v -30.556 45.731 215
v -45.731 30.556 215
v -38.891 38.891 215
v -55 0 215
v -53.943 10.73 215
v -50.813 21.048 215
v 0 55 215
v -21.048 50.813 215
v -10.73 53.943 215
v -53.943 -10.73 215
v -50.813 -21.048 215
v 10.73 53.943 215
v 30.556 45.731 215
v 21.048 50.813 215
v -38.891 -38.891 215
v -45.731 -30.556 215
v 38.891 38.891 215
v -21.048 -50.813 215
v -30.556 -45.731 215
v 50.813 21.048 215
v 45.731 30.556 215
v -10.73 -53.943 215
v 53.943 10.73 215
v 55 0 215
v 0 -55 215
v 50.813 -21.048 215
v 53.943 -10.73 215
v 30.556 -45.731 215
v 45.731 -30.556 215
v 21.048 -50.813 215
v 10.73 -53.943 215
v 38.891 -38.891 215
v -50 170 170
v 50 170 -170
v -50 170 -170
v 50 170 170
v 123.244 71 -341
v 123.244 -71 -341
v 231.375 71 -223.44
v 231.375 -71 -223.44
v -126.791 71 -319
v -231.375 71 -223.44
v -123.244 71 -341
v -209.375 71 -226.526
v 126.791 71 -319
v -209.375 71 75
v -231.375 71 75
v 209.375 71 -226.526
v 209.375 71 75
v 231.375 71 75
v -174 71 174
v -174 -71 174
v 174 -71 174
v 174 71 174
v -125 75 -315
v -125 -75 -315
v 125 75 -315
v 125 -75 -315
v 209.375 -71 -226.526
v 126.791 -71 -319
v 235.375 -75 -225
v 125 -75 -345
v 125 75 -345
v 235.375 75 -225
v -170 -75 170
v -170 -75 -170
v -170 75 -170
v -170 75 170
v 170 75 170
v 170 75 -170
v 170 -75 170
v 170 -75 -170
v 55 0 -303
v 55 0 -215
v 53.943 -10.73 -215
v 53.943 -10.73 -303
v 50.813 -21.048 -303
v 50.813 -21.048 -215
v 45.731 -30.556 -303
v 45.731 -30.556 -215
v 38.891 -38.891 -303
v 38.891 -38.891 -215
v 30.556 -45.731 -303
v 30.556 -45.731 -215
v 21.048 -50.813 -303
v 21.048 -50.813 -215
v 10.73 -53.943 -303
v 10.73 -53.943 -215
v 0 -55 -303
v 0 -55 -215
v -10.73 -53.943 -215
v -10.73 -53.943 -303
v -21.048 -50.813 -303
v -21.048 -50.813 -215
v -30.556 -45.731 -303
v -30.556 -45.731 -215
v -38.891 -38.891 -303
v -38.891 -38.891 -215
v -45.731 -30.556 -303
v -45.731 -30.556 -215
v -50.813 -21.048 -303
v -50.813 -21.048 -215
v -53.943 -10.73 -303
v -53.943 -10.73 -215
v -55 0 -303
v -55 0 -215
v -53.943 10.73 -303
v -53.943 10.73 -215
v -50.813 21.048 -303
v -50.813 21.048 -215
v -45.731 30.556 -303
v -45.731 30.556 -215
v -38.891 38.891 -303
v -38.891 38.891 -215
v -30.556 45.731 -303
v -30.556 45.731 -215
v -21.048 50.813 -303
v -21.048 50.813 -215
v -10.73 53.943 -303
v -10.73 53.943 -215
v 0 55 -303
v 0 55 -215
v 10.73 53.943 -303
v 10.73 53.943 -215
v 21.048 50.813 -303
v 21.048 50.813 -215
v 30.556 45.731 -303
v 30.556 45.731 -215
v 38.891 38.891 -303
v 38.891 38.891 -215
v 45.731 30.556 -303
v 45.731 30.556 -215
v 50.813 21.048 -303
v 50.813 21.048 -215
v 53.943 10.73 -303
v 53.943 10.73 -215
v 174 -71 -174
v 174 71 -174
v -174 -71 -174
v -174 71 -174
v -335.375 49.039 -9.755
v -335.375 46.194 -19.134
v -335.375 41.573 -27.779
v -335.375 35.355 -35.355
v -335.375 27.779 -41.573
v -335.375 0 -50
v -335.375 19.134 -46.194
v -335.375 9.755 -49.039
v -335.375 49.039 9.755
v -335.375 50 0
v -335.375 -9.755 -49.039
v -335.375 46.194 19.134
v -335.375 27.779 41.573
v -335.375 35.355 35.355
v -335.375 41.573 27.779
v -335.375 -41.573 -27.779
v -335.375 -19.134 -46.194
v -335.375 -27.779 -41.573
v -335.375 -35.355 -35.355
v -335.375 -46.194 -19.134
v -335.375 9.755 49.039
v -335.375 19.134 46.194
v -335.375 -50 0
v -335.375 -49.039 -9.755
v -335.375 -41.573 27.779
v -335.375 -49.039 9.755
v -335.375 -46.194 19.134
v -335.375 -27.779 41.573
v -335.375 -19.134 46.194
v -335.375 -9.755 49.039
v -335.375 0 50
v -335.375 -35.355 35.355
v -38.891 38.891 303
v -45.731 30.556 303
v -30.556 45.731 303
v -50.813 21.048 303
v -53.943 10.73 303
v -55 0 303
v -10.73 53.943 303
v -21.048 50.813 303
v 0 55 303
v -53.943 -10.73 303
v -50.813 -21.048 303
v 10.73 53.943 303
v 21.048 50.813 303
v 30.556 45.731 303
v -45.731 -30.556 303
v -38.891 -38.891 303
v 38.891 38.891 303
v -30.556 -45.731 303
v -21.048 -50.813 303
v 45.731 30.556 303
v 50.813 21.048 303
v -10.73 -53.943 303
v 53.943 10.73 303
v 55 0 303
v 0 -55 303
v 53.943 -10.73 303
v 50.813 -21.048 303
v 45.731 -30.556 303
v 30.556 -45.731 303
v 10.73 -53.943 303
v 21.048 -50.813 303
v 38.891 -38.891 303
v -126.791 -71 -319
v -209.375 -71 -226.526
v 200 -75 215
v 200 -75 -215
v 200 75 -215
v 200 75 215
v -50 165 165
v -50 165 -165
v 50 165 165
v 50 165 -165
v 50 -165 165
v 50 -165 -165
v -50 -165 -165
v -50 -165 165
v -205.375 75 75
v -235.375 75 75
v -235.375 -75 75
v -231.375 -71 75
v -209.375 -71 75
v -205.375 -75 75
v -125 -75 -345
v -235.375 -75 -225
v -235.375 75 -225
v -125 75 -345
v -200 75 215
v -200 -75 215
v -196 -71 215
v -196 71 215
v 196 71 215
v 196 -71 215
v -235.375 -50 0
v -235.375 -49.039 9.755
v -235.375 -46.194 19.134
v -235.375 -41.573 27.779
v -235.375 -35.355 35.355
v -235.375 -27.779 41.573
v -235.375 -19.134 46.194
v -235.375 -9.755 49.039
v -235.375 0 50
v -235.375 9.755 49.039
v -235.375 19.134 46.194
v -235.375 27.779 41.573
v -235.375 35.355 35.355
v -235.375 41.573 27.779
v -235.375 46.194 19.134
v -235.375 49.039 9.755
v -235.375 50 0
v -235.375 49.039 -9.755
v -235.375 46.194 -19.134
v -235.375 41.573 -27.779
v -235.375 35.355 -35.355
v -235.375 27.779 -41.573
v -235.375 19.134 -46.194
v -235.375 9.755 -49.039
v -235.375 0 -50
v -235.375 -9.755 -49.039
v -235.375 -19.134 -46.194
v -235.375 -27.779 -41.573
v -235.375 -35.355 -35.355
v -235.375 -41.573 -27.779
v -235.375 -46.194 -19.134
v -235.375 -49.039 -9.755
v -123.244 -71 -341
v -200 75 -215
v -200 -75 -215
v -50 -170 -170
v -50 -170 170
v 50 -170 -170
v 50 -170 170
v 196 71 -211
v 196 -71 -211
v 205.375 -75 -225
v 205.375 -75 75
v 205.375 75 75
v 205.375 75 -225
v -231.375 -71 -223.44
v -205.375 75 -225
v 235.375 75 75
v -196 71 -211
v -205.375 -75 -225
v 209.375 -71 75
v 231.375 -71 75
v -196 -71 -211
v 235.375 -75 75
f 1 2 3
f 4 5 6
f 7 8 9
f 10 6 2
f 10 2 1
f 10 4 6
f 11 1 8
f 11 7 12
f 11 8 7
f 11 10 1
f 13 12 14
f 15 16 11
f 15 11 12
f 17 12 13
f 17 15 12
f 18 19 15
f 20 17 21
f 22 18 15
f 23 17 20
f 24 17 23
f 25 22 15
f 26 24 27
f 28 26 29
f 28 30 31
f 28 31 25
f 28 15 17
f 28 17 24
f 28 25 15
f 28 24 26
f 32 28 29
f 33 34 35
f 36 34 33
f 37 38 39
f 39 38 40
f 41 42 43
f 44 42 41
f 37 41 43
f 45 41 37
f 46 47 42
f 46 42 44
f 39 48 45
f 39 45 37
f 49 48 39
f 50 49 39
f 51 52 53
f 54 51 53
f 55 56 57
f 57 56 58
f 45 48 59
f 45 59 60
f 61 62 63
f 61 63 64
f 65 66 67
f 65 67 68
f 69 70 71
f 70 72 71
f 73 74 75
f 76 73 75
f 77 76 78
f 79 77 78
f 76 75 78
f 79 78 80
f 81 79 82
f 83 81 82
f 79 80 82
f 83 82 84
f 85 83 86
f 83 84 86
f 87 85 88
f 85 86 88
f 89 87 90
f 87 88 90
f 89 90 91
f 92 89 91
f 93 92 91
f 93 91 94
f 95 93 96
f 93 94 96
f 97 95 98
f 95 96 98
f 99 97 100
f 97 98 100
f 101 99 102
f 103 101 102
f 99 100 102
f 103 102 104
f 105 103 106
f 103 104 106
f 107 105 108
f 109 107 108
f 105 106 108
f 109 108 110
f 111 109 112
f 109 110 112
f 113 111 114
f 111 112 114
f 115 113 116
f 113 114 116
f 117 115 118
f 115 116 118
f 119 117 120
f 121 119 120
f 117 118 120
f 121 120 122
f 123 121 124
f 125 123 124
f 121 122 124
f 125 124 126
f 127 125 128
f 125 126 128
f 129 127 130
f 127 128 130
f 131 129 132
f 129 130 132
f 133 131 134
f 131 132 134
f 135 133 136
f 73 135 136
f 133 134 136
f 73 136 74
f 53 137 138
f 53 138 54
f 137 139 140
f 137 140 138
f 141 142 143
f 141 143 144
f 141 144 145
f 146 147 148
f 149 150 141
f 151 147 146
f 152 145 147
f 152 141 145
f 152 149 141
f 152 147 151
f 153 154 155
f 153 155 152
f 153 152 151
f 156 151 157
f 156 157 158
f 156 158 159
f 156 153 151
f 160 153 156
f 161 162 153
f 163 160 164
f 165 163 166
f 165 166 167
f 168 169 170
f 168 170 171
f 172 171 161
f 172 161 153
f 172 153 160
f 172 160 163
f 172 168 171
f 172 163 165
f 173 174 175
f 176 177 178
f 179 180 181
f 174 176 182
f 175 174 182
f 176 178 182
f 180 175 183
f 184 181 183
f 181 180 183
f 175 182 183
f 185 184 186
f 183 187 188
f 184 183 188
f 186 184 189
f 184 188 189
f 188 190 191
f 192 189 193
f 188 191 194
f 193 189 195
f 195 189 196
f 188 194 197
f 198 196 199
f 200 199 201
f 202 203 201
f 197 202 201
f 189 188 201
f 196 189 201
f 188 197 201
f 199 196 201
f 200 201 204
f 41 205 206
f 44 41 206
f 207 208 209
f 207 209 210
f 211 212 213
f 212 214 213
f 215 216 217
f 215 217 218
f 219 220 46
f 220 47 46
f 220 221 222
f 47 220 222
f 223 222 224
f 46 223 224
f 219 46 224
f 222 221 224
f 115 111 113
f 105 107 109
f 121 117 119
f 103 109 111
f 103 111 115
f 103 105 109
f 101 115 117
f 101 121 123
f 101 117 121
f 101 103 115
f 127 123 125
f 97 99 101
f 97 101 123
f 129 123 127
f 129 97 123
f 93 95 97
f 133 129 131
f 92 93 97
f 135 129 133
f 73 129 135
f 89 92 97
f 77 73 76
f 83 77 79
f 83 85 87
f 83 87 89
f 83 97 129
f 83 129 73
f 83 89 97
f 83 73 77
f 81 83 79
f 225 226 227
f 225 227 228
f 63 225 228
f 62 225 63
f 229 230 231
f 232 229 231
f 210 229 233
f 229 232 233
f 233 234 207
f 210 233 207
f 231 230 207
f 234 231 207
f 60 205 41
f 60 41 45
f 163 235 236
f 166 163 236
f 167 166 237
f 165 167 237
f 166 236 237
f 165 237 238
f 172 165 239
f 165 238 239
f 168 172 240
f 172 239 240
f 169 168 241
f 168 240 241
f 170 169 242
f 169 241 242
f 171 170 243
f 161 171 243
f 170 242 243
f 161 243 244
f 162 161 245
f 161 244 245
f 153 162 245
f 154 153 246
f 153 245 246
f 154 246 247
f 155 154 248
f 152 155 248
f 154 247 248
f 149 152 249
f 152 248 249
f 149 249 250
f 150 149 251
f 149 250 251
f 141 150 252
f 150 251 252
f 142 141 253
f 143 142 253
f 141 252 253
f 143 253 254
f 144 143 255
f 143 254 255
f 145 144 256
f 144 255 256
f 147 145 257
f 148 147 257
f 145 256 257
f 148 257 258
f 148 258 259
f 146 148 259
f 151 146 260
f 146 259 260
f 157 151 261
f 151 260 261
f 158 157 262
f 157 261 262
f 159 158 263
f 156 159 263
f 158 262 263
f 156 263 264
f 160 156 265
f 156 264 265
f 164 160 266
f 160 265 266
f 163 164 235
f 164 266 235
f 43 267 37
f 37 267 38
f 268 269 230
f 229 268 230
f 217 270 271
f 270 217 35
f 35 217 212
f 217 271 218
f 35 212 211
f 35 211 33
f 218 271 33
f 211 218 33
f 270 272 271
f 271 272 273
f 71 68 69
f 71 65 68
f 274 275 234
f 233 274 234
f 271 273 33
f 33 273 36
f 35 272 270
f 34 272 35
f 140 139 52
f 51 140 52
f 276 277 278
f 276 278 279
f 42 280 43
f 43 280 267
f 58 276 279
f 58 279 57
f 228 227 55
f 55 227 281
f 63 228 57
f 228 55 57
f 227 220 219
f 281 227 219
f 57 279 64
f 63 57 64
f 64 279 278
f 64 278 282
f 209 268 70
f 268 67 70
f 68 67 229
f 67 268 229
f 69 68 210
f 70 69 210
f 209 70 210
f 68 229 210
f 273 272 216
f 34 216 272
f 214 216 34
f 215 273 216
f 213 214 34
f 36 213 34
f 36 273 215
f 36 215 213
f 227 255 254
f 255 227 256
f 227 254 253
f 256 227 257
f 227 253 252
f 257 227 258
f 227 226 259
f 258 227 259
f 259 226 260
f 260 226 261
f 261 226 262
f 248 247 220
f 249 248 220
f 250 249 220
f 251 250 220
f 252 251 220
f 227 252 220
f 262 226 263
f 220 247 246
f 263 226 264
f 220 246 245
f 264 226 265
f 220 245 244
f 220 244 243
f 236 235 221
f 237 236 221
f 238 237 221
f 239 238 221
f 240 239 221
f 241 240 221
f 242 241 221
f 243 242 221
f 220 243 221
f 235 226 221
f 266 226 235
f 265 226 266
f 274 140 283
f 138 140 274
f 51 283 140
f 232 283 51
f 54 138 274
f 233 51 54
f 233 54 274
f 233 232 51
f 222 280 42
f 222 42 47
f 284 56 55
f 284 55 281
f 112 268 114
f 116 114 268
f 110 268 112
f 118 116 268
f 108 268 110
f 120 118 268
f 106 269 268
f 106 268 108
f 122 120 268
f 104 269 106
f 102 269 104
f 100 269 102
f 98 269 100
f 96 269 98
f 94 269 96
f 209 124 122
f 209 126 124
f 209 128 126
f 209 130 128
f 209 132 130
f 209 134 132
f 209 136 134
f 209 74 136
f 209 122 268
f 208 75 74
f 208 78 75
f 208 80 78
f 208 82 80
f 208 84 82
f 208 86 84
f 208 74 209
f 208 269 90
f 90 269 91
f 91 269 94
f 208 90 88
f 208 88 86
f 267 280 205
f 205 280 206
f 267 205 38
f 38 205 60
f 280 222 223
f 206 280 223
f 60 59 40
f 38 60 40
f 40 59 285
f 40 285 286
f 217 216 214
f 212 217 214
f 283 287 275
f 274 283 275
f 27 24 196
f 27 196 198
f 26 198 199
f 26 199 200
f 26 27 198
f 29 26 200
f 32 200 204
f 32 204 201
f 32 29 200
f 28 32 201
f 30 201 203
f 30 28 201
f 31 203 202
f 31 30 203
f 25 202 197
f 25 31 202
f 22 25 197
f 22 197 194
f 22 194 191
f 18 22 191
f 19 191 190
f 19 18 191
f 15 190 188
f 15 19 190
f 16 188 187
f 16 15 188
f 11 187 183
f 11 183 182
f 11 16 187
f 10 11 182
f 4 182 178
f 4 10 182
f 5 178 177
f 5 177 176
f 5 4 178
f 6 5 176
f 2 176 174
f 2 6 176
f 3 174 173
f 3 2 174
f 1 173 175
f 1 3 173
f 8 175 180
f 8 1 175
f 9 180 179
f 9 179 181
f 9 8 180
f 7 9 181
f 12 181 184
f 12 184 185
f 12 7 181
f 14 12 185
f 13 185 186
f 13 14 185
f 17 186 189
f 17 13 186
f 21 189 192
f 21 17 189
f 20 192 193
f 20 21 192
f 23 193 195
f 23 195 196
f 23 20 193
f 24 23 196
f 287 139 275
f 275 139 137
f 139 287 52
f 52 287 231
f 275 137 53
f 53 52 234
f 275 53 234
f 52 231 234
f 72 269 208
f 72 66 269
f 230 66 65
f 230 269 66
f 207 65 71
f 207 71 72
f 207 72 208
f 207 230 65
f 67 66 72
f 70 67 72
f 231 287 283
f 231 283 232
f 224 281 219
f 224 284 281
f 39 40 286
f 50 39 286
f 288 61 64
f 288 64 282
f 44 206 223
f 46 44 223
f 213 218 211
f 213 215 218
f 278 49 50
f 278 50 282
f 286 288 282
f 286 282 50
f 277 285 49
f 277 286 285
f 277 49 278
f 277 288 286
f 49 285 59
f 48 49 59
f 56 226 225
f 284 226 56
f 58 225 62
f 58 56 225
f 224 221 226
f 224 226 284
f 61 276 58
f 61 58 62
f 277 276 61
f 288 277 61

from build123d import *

# Parameters (mm, degrees)
F0_W      = 340
F0_H      = 340
F0_W_2    = 330
F0_H_2    = 330
F1_DEPTH  = 50
F2_W      = 400
F2_H      = 430
F2_W_2    = 340
F2_H_2    = 340
F3_DEPTH  = 75
F4_W      = 30
F4_H      = 300
F4_W_2    = 250
F4_H_2    = 30
F5_DEPTH  = 75
F6_T      = -4
F8_T      = -4
F7_R      = 50
F9_DEPTH  = 100
F10_R     = 55
F11_DEPTH = 88


# Not quite as in the source:
# - a pattern or mirror of a feature is missing from the dataset's text; its kind, count and spacing are read off the source's solid


with BuildPart() as f1:
    # F0 (on Right) → F1 (new body, symmetric)
    with BuildSketch(Plane.YZ):
        Rectangle(F0_W, F0_H)
        Rectangle(F0_W_2, F0_H_2, mode=Mode.SUBTRACT)
    extrude(amount=F1_DEPTH, both=True)


with BuildPart() as f3:
    # F2 (on Front) → F3 (new body, symmetric)
    with BuildSketch(Plane.XZ):
        Rectangle(F2_W, F2_H)
        Rectangle(F2_W_2, F2_H_2, mode=Mode.SUBTRACT)
    extrude(amount=F3_DEPTH, both=True)

    # F8
    f8_openings = [f3.faces().sort_by_distance(p)[0] for p in [
        (0, 0, 215),
    ]]
    offset(amount=F8_T, openings=f8_openings, kind=Kind.INTERSECTION)

    # F10 (on face) → F11 (join)
    with BuildSketch(Plane(origin=(0, 0, -215), x_dir=(1, 0, 0), z_dir=(0, 0, -1))):
        Circle(F10_R)
    f11 = extrude(amount=F11_DEPTH)

    # F11_copies: F11 across plane
    add(f11.mirror(Plane.XY))


with BuildPart() as f5:
    # F4 (on Front) → F5 (new body, symmetric)
    with BuildSketch(Plane.XZ):
        with Locations((-220.3749617156, -75)):
            Rectangle(F4_W, F4_H)
        Polygon((-205.3749617156, -225), (-235.3749617156, -225), (-125, -345), (-125, -315), align=None)
        with Locations((0, -330)):
            Rectangle(F4_W_2, F4_H_2)
        Polygon((125, -315), (125, -345), (235.3749617156, -225), (235.3749617156, 75), (205.3749617156, 75), (205.3749617156, -225), align=None)
    extrude(amount=F5_DEPTH, both=True)

    # F6
    f6_openings = [f5.faces().sort_by_distance(p)[0] for p in [
        (-220.374962, 0, 75),
        (220.374962, 0, 75),
    ]]
    offset(amount=F6_T, openings=f6_openings, kind=Kind.INTERSECTION)

    # F7 (on face) → F9 (join)
    with BuildSketch(Plane(origin=(-235.3749617156, 0, 0), x_dir=(0, -1, 0), z_dir=(-1, 0, 0))):
        Circle(F7_R)
    extrude(amount=F9_DEPTH)


solid = Compound([f1.part, f3.part, f5.part])
